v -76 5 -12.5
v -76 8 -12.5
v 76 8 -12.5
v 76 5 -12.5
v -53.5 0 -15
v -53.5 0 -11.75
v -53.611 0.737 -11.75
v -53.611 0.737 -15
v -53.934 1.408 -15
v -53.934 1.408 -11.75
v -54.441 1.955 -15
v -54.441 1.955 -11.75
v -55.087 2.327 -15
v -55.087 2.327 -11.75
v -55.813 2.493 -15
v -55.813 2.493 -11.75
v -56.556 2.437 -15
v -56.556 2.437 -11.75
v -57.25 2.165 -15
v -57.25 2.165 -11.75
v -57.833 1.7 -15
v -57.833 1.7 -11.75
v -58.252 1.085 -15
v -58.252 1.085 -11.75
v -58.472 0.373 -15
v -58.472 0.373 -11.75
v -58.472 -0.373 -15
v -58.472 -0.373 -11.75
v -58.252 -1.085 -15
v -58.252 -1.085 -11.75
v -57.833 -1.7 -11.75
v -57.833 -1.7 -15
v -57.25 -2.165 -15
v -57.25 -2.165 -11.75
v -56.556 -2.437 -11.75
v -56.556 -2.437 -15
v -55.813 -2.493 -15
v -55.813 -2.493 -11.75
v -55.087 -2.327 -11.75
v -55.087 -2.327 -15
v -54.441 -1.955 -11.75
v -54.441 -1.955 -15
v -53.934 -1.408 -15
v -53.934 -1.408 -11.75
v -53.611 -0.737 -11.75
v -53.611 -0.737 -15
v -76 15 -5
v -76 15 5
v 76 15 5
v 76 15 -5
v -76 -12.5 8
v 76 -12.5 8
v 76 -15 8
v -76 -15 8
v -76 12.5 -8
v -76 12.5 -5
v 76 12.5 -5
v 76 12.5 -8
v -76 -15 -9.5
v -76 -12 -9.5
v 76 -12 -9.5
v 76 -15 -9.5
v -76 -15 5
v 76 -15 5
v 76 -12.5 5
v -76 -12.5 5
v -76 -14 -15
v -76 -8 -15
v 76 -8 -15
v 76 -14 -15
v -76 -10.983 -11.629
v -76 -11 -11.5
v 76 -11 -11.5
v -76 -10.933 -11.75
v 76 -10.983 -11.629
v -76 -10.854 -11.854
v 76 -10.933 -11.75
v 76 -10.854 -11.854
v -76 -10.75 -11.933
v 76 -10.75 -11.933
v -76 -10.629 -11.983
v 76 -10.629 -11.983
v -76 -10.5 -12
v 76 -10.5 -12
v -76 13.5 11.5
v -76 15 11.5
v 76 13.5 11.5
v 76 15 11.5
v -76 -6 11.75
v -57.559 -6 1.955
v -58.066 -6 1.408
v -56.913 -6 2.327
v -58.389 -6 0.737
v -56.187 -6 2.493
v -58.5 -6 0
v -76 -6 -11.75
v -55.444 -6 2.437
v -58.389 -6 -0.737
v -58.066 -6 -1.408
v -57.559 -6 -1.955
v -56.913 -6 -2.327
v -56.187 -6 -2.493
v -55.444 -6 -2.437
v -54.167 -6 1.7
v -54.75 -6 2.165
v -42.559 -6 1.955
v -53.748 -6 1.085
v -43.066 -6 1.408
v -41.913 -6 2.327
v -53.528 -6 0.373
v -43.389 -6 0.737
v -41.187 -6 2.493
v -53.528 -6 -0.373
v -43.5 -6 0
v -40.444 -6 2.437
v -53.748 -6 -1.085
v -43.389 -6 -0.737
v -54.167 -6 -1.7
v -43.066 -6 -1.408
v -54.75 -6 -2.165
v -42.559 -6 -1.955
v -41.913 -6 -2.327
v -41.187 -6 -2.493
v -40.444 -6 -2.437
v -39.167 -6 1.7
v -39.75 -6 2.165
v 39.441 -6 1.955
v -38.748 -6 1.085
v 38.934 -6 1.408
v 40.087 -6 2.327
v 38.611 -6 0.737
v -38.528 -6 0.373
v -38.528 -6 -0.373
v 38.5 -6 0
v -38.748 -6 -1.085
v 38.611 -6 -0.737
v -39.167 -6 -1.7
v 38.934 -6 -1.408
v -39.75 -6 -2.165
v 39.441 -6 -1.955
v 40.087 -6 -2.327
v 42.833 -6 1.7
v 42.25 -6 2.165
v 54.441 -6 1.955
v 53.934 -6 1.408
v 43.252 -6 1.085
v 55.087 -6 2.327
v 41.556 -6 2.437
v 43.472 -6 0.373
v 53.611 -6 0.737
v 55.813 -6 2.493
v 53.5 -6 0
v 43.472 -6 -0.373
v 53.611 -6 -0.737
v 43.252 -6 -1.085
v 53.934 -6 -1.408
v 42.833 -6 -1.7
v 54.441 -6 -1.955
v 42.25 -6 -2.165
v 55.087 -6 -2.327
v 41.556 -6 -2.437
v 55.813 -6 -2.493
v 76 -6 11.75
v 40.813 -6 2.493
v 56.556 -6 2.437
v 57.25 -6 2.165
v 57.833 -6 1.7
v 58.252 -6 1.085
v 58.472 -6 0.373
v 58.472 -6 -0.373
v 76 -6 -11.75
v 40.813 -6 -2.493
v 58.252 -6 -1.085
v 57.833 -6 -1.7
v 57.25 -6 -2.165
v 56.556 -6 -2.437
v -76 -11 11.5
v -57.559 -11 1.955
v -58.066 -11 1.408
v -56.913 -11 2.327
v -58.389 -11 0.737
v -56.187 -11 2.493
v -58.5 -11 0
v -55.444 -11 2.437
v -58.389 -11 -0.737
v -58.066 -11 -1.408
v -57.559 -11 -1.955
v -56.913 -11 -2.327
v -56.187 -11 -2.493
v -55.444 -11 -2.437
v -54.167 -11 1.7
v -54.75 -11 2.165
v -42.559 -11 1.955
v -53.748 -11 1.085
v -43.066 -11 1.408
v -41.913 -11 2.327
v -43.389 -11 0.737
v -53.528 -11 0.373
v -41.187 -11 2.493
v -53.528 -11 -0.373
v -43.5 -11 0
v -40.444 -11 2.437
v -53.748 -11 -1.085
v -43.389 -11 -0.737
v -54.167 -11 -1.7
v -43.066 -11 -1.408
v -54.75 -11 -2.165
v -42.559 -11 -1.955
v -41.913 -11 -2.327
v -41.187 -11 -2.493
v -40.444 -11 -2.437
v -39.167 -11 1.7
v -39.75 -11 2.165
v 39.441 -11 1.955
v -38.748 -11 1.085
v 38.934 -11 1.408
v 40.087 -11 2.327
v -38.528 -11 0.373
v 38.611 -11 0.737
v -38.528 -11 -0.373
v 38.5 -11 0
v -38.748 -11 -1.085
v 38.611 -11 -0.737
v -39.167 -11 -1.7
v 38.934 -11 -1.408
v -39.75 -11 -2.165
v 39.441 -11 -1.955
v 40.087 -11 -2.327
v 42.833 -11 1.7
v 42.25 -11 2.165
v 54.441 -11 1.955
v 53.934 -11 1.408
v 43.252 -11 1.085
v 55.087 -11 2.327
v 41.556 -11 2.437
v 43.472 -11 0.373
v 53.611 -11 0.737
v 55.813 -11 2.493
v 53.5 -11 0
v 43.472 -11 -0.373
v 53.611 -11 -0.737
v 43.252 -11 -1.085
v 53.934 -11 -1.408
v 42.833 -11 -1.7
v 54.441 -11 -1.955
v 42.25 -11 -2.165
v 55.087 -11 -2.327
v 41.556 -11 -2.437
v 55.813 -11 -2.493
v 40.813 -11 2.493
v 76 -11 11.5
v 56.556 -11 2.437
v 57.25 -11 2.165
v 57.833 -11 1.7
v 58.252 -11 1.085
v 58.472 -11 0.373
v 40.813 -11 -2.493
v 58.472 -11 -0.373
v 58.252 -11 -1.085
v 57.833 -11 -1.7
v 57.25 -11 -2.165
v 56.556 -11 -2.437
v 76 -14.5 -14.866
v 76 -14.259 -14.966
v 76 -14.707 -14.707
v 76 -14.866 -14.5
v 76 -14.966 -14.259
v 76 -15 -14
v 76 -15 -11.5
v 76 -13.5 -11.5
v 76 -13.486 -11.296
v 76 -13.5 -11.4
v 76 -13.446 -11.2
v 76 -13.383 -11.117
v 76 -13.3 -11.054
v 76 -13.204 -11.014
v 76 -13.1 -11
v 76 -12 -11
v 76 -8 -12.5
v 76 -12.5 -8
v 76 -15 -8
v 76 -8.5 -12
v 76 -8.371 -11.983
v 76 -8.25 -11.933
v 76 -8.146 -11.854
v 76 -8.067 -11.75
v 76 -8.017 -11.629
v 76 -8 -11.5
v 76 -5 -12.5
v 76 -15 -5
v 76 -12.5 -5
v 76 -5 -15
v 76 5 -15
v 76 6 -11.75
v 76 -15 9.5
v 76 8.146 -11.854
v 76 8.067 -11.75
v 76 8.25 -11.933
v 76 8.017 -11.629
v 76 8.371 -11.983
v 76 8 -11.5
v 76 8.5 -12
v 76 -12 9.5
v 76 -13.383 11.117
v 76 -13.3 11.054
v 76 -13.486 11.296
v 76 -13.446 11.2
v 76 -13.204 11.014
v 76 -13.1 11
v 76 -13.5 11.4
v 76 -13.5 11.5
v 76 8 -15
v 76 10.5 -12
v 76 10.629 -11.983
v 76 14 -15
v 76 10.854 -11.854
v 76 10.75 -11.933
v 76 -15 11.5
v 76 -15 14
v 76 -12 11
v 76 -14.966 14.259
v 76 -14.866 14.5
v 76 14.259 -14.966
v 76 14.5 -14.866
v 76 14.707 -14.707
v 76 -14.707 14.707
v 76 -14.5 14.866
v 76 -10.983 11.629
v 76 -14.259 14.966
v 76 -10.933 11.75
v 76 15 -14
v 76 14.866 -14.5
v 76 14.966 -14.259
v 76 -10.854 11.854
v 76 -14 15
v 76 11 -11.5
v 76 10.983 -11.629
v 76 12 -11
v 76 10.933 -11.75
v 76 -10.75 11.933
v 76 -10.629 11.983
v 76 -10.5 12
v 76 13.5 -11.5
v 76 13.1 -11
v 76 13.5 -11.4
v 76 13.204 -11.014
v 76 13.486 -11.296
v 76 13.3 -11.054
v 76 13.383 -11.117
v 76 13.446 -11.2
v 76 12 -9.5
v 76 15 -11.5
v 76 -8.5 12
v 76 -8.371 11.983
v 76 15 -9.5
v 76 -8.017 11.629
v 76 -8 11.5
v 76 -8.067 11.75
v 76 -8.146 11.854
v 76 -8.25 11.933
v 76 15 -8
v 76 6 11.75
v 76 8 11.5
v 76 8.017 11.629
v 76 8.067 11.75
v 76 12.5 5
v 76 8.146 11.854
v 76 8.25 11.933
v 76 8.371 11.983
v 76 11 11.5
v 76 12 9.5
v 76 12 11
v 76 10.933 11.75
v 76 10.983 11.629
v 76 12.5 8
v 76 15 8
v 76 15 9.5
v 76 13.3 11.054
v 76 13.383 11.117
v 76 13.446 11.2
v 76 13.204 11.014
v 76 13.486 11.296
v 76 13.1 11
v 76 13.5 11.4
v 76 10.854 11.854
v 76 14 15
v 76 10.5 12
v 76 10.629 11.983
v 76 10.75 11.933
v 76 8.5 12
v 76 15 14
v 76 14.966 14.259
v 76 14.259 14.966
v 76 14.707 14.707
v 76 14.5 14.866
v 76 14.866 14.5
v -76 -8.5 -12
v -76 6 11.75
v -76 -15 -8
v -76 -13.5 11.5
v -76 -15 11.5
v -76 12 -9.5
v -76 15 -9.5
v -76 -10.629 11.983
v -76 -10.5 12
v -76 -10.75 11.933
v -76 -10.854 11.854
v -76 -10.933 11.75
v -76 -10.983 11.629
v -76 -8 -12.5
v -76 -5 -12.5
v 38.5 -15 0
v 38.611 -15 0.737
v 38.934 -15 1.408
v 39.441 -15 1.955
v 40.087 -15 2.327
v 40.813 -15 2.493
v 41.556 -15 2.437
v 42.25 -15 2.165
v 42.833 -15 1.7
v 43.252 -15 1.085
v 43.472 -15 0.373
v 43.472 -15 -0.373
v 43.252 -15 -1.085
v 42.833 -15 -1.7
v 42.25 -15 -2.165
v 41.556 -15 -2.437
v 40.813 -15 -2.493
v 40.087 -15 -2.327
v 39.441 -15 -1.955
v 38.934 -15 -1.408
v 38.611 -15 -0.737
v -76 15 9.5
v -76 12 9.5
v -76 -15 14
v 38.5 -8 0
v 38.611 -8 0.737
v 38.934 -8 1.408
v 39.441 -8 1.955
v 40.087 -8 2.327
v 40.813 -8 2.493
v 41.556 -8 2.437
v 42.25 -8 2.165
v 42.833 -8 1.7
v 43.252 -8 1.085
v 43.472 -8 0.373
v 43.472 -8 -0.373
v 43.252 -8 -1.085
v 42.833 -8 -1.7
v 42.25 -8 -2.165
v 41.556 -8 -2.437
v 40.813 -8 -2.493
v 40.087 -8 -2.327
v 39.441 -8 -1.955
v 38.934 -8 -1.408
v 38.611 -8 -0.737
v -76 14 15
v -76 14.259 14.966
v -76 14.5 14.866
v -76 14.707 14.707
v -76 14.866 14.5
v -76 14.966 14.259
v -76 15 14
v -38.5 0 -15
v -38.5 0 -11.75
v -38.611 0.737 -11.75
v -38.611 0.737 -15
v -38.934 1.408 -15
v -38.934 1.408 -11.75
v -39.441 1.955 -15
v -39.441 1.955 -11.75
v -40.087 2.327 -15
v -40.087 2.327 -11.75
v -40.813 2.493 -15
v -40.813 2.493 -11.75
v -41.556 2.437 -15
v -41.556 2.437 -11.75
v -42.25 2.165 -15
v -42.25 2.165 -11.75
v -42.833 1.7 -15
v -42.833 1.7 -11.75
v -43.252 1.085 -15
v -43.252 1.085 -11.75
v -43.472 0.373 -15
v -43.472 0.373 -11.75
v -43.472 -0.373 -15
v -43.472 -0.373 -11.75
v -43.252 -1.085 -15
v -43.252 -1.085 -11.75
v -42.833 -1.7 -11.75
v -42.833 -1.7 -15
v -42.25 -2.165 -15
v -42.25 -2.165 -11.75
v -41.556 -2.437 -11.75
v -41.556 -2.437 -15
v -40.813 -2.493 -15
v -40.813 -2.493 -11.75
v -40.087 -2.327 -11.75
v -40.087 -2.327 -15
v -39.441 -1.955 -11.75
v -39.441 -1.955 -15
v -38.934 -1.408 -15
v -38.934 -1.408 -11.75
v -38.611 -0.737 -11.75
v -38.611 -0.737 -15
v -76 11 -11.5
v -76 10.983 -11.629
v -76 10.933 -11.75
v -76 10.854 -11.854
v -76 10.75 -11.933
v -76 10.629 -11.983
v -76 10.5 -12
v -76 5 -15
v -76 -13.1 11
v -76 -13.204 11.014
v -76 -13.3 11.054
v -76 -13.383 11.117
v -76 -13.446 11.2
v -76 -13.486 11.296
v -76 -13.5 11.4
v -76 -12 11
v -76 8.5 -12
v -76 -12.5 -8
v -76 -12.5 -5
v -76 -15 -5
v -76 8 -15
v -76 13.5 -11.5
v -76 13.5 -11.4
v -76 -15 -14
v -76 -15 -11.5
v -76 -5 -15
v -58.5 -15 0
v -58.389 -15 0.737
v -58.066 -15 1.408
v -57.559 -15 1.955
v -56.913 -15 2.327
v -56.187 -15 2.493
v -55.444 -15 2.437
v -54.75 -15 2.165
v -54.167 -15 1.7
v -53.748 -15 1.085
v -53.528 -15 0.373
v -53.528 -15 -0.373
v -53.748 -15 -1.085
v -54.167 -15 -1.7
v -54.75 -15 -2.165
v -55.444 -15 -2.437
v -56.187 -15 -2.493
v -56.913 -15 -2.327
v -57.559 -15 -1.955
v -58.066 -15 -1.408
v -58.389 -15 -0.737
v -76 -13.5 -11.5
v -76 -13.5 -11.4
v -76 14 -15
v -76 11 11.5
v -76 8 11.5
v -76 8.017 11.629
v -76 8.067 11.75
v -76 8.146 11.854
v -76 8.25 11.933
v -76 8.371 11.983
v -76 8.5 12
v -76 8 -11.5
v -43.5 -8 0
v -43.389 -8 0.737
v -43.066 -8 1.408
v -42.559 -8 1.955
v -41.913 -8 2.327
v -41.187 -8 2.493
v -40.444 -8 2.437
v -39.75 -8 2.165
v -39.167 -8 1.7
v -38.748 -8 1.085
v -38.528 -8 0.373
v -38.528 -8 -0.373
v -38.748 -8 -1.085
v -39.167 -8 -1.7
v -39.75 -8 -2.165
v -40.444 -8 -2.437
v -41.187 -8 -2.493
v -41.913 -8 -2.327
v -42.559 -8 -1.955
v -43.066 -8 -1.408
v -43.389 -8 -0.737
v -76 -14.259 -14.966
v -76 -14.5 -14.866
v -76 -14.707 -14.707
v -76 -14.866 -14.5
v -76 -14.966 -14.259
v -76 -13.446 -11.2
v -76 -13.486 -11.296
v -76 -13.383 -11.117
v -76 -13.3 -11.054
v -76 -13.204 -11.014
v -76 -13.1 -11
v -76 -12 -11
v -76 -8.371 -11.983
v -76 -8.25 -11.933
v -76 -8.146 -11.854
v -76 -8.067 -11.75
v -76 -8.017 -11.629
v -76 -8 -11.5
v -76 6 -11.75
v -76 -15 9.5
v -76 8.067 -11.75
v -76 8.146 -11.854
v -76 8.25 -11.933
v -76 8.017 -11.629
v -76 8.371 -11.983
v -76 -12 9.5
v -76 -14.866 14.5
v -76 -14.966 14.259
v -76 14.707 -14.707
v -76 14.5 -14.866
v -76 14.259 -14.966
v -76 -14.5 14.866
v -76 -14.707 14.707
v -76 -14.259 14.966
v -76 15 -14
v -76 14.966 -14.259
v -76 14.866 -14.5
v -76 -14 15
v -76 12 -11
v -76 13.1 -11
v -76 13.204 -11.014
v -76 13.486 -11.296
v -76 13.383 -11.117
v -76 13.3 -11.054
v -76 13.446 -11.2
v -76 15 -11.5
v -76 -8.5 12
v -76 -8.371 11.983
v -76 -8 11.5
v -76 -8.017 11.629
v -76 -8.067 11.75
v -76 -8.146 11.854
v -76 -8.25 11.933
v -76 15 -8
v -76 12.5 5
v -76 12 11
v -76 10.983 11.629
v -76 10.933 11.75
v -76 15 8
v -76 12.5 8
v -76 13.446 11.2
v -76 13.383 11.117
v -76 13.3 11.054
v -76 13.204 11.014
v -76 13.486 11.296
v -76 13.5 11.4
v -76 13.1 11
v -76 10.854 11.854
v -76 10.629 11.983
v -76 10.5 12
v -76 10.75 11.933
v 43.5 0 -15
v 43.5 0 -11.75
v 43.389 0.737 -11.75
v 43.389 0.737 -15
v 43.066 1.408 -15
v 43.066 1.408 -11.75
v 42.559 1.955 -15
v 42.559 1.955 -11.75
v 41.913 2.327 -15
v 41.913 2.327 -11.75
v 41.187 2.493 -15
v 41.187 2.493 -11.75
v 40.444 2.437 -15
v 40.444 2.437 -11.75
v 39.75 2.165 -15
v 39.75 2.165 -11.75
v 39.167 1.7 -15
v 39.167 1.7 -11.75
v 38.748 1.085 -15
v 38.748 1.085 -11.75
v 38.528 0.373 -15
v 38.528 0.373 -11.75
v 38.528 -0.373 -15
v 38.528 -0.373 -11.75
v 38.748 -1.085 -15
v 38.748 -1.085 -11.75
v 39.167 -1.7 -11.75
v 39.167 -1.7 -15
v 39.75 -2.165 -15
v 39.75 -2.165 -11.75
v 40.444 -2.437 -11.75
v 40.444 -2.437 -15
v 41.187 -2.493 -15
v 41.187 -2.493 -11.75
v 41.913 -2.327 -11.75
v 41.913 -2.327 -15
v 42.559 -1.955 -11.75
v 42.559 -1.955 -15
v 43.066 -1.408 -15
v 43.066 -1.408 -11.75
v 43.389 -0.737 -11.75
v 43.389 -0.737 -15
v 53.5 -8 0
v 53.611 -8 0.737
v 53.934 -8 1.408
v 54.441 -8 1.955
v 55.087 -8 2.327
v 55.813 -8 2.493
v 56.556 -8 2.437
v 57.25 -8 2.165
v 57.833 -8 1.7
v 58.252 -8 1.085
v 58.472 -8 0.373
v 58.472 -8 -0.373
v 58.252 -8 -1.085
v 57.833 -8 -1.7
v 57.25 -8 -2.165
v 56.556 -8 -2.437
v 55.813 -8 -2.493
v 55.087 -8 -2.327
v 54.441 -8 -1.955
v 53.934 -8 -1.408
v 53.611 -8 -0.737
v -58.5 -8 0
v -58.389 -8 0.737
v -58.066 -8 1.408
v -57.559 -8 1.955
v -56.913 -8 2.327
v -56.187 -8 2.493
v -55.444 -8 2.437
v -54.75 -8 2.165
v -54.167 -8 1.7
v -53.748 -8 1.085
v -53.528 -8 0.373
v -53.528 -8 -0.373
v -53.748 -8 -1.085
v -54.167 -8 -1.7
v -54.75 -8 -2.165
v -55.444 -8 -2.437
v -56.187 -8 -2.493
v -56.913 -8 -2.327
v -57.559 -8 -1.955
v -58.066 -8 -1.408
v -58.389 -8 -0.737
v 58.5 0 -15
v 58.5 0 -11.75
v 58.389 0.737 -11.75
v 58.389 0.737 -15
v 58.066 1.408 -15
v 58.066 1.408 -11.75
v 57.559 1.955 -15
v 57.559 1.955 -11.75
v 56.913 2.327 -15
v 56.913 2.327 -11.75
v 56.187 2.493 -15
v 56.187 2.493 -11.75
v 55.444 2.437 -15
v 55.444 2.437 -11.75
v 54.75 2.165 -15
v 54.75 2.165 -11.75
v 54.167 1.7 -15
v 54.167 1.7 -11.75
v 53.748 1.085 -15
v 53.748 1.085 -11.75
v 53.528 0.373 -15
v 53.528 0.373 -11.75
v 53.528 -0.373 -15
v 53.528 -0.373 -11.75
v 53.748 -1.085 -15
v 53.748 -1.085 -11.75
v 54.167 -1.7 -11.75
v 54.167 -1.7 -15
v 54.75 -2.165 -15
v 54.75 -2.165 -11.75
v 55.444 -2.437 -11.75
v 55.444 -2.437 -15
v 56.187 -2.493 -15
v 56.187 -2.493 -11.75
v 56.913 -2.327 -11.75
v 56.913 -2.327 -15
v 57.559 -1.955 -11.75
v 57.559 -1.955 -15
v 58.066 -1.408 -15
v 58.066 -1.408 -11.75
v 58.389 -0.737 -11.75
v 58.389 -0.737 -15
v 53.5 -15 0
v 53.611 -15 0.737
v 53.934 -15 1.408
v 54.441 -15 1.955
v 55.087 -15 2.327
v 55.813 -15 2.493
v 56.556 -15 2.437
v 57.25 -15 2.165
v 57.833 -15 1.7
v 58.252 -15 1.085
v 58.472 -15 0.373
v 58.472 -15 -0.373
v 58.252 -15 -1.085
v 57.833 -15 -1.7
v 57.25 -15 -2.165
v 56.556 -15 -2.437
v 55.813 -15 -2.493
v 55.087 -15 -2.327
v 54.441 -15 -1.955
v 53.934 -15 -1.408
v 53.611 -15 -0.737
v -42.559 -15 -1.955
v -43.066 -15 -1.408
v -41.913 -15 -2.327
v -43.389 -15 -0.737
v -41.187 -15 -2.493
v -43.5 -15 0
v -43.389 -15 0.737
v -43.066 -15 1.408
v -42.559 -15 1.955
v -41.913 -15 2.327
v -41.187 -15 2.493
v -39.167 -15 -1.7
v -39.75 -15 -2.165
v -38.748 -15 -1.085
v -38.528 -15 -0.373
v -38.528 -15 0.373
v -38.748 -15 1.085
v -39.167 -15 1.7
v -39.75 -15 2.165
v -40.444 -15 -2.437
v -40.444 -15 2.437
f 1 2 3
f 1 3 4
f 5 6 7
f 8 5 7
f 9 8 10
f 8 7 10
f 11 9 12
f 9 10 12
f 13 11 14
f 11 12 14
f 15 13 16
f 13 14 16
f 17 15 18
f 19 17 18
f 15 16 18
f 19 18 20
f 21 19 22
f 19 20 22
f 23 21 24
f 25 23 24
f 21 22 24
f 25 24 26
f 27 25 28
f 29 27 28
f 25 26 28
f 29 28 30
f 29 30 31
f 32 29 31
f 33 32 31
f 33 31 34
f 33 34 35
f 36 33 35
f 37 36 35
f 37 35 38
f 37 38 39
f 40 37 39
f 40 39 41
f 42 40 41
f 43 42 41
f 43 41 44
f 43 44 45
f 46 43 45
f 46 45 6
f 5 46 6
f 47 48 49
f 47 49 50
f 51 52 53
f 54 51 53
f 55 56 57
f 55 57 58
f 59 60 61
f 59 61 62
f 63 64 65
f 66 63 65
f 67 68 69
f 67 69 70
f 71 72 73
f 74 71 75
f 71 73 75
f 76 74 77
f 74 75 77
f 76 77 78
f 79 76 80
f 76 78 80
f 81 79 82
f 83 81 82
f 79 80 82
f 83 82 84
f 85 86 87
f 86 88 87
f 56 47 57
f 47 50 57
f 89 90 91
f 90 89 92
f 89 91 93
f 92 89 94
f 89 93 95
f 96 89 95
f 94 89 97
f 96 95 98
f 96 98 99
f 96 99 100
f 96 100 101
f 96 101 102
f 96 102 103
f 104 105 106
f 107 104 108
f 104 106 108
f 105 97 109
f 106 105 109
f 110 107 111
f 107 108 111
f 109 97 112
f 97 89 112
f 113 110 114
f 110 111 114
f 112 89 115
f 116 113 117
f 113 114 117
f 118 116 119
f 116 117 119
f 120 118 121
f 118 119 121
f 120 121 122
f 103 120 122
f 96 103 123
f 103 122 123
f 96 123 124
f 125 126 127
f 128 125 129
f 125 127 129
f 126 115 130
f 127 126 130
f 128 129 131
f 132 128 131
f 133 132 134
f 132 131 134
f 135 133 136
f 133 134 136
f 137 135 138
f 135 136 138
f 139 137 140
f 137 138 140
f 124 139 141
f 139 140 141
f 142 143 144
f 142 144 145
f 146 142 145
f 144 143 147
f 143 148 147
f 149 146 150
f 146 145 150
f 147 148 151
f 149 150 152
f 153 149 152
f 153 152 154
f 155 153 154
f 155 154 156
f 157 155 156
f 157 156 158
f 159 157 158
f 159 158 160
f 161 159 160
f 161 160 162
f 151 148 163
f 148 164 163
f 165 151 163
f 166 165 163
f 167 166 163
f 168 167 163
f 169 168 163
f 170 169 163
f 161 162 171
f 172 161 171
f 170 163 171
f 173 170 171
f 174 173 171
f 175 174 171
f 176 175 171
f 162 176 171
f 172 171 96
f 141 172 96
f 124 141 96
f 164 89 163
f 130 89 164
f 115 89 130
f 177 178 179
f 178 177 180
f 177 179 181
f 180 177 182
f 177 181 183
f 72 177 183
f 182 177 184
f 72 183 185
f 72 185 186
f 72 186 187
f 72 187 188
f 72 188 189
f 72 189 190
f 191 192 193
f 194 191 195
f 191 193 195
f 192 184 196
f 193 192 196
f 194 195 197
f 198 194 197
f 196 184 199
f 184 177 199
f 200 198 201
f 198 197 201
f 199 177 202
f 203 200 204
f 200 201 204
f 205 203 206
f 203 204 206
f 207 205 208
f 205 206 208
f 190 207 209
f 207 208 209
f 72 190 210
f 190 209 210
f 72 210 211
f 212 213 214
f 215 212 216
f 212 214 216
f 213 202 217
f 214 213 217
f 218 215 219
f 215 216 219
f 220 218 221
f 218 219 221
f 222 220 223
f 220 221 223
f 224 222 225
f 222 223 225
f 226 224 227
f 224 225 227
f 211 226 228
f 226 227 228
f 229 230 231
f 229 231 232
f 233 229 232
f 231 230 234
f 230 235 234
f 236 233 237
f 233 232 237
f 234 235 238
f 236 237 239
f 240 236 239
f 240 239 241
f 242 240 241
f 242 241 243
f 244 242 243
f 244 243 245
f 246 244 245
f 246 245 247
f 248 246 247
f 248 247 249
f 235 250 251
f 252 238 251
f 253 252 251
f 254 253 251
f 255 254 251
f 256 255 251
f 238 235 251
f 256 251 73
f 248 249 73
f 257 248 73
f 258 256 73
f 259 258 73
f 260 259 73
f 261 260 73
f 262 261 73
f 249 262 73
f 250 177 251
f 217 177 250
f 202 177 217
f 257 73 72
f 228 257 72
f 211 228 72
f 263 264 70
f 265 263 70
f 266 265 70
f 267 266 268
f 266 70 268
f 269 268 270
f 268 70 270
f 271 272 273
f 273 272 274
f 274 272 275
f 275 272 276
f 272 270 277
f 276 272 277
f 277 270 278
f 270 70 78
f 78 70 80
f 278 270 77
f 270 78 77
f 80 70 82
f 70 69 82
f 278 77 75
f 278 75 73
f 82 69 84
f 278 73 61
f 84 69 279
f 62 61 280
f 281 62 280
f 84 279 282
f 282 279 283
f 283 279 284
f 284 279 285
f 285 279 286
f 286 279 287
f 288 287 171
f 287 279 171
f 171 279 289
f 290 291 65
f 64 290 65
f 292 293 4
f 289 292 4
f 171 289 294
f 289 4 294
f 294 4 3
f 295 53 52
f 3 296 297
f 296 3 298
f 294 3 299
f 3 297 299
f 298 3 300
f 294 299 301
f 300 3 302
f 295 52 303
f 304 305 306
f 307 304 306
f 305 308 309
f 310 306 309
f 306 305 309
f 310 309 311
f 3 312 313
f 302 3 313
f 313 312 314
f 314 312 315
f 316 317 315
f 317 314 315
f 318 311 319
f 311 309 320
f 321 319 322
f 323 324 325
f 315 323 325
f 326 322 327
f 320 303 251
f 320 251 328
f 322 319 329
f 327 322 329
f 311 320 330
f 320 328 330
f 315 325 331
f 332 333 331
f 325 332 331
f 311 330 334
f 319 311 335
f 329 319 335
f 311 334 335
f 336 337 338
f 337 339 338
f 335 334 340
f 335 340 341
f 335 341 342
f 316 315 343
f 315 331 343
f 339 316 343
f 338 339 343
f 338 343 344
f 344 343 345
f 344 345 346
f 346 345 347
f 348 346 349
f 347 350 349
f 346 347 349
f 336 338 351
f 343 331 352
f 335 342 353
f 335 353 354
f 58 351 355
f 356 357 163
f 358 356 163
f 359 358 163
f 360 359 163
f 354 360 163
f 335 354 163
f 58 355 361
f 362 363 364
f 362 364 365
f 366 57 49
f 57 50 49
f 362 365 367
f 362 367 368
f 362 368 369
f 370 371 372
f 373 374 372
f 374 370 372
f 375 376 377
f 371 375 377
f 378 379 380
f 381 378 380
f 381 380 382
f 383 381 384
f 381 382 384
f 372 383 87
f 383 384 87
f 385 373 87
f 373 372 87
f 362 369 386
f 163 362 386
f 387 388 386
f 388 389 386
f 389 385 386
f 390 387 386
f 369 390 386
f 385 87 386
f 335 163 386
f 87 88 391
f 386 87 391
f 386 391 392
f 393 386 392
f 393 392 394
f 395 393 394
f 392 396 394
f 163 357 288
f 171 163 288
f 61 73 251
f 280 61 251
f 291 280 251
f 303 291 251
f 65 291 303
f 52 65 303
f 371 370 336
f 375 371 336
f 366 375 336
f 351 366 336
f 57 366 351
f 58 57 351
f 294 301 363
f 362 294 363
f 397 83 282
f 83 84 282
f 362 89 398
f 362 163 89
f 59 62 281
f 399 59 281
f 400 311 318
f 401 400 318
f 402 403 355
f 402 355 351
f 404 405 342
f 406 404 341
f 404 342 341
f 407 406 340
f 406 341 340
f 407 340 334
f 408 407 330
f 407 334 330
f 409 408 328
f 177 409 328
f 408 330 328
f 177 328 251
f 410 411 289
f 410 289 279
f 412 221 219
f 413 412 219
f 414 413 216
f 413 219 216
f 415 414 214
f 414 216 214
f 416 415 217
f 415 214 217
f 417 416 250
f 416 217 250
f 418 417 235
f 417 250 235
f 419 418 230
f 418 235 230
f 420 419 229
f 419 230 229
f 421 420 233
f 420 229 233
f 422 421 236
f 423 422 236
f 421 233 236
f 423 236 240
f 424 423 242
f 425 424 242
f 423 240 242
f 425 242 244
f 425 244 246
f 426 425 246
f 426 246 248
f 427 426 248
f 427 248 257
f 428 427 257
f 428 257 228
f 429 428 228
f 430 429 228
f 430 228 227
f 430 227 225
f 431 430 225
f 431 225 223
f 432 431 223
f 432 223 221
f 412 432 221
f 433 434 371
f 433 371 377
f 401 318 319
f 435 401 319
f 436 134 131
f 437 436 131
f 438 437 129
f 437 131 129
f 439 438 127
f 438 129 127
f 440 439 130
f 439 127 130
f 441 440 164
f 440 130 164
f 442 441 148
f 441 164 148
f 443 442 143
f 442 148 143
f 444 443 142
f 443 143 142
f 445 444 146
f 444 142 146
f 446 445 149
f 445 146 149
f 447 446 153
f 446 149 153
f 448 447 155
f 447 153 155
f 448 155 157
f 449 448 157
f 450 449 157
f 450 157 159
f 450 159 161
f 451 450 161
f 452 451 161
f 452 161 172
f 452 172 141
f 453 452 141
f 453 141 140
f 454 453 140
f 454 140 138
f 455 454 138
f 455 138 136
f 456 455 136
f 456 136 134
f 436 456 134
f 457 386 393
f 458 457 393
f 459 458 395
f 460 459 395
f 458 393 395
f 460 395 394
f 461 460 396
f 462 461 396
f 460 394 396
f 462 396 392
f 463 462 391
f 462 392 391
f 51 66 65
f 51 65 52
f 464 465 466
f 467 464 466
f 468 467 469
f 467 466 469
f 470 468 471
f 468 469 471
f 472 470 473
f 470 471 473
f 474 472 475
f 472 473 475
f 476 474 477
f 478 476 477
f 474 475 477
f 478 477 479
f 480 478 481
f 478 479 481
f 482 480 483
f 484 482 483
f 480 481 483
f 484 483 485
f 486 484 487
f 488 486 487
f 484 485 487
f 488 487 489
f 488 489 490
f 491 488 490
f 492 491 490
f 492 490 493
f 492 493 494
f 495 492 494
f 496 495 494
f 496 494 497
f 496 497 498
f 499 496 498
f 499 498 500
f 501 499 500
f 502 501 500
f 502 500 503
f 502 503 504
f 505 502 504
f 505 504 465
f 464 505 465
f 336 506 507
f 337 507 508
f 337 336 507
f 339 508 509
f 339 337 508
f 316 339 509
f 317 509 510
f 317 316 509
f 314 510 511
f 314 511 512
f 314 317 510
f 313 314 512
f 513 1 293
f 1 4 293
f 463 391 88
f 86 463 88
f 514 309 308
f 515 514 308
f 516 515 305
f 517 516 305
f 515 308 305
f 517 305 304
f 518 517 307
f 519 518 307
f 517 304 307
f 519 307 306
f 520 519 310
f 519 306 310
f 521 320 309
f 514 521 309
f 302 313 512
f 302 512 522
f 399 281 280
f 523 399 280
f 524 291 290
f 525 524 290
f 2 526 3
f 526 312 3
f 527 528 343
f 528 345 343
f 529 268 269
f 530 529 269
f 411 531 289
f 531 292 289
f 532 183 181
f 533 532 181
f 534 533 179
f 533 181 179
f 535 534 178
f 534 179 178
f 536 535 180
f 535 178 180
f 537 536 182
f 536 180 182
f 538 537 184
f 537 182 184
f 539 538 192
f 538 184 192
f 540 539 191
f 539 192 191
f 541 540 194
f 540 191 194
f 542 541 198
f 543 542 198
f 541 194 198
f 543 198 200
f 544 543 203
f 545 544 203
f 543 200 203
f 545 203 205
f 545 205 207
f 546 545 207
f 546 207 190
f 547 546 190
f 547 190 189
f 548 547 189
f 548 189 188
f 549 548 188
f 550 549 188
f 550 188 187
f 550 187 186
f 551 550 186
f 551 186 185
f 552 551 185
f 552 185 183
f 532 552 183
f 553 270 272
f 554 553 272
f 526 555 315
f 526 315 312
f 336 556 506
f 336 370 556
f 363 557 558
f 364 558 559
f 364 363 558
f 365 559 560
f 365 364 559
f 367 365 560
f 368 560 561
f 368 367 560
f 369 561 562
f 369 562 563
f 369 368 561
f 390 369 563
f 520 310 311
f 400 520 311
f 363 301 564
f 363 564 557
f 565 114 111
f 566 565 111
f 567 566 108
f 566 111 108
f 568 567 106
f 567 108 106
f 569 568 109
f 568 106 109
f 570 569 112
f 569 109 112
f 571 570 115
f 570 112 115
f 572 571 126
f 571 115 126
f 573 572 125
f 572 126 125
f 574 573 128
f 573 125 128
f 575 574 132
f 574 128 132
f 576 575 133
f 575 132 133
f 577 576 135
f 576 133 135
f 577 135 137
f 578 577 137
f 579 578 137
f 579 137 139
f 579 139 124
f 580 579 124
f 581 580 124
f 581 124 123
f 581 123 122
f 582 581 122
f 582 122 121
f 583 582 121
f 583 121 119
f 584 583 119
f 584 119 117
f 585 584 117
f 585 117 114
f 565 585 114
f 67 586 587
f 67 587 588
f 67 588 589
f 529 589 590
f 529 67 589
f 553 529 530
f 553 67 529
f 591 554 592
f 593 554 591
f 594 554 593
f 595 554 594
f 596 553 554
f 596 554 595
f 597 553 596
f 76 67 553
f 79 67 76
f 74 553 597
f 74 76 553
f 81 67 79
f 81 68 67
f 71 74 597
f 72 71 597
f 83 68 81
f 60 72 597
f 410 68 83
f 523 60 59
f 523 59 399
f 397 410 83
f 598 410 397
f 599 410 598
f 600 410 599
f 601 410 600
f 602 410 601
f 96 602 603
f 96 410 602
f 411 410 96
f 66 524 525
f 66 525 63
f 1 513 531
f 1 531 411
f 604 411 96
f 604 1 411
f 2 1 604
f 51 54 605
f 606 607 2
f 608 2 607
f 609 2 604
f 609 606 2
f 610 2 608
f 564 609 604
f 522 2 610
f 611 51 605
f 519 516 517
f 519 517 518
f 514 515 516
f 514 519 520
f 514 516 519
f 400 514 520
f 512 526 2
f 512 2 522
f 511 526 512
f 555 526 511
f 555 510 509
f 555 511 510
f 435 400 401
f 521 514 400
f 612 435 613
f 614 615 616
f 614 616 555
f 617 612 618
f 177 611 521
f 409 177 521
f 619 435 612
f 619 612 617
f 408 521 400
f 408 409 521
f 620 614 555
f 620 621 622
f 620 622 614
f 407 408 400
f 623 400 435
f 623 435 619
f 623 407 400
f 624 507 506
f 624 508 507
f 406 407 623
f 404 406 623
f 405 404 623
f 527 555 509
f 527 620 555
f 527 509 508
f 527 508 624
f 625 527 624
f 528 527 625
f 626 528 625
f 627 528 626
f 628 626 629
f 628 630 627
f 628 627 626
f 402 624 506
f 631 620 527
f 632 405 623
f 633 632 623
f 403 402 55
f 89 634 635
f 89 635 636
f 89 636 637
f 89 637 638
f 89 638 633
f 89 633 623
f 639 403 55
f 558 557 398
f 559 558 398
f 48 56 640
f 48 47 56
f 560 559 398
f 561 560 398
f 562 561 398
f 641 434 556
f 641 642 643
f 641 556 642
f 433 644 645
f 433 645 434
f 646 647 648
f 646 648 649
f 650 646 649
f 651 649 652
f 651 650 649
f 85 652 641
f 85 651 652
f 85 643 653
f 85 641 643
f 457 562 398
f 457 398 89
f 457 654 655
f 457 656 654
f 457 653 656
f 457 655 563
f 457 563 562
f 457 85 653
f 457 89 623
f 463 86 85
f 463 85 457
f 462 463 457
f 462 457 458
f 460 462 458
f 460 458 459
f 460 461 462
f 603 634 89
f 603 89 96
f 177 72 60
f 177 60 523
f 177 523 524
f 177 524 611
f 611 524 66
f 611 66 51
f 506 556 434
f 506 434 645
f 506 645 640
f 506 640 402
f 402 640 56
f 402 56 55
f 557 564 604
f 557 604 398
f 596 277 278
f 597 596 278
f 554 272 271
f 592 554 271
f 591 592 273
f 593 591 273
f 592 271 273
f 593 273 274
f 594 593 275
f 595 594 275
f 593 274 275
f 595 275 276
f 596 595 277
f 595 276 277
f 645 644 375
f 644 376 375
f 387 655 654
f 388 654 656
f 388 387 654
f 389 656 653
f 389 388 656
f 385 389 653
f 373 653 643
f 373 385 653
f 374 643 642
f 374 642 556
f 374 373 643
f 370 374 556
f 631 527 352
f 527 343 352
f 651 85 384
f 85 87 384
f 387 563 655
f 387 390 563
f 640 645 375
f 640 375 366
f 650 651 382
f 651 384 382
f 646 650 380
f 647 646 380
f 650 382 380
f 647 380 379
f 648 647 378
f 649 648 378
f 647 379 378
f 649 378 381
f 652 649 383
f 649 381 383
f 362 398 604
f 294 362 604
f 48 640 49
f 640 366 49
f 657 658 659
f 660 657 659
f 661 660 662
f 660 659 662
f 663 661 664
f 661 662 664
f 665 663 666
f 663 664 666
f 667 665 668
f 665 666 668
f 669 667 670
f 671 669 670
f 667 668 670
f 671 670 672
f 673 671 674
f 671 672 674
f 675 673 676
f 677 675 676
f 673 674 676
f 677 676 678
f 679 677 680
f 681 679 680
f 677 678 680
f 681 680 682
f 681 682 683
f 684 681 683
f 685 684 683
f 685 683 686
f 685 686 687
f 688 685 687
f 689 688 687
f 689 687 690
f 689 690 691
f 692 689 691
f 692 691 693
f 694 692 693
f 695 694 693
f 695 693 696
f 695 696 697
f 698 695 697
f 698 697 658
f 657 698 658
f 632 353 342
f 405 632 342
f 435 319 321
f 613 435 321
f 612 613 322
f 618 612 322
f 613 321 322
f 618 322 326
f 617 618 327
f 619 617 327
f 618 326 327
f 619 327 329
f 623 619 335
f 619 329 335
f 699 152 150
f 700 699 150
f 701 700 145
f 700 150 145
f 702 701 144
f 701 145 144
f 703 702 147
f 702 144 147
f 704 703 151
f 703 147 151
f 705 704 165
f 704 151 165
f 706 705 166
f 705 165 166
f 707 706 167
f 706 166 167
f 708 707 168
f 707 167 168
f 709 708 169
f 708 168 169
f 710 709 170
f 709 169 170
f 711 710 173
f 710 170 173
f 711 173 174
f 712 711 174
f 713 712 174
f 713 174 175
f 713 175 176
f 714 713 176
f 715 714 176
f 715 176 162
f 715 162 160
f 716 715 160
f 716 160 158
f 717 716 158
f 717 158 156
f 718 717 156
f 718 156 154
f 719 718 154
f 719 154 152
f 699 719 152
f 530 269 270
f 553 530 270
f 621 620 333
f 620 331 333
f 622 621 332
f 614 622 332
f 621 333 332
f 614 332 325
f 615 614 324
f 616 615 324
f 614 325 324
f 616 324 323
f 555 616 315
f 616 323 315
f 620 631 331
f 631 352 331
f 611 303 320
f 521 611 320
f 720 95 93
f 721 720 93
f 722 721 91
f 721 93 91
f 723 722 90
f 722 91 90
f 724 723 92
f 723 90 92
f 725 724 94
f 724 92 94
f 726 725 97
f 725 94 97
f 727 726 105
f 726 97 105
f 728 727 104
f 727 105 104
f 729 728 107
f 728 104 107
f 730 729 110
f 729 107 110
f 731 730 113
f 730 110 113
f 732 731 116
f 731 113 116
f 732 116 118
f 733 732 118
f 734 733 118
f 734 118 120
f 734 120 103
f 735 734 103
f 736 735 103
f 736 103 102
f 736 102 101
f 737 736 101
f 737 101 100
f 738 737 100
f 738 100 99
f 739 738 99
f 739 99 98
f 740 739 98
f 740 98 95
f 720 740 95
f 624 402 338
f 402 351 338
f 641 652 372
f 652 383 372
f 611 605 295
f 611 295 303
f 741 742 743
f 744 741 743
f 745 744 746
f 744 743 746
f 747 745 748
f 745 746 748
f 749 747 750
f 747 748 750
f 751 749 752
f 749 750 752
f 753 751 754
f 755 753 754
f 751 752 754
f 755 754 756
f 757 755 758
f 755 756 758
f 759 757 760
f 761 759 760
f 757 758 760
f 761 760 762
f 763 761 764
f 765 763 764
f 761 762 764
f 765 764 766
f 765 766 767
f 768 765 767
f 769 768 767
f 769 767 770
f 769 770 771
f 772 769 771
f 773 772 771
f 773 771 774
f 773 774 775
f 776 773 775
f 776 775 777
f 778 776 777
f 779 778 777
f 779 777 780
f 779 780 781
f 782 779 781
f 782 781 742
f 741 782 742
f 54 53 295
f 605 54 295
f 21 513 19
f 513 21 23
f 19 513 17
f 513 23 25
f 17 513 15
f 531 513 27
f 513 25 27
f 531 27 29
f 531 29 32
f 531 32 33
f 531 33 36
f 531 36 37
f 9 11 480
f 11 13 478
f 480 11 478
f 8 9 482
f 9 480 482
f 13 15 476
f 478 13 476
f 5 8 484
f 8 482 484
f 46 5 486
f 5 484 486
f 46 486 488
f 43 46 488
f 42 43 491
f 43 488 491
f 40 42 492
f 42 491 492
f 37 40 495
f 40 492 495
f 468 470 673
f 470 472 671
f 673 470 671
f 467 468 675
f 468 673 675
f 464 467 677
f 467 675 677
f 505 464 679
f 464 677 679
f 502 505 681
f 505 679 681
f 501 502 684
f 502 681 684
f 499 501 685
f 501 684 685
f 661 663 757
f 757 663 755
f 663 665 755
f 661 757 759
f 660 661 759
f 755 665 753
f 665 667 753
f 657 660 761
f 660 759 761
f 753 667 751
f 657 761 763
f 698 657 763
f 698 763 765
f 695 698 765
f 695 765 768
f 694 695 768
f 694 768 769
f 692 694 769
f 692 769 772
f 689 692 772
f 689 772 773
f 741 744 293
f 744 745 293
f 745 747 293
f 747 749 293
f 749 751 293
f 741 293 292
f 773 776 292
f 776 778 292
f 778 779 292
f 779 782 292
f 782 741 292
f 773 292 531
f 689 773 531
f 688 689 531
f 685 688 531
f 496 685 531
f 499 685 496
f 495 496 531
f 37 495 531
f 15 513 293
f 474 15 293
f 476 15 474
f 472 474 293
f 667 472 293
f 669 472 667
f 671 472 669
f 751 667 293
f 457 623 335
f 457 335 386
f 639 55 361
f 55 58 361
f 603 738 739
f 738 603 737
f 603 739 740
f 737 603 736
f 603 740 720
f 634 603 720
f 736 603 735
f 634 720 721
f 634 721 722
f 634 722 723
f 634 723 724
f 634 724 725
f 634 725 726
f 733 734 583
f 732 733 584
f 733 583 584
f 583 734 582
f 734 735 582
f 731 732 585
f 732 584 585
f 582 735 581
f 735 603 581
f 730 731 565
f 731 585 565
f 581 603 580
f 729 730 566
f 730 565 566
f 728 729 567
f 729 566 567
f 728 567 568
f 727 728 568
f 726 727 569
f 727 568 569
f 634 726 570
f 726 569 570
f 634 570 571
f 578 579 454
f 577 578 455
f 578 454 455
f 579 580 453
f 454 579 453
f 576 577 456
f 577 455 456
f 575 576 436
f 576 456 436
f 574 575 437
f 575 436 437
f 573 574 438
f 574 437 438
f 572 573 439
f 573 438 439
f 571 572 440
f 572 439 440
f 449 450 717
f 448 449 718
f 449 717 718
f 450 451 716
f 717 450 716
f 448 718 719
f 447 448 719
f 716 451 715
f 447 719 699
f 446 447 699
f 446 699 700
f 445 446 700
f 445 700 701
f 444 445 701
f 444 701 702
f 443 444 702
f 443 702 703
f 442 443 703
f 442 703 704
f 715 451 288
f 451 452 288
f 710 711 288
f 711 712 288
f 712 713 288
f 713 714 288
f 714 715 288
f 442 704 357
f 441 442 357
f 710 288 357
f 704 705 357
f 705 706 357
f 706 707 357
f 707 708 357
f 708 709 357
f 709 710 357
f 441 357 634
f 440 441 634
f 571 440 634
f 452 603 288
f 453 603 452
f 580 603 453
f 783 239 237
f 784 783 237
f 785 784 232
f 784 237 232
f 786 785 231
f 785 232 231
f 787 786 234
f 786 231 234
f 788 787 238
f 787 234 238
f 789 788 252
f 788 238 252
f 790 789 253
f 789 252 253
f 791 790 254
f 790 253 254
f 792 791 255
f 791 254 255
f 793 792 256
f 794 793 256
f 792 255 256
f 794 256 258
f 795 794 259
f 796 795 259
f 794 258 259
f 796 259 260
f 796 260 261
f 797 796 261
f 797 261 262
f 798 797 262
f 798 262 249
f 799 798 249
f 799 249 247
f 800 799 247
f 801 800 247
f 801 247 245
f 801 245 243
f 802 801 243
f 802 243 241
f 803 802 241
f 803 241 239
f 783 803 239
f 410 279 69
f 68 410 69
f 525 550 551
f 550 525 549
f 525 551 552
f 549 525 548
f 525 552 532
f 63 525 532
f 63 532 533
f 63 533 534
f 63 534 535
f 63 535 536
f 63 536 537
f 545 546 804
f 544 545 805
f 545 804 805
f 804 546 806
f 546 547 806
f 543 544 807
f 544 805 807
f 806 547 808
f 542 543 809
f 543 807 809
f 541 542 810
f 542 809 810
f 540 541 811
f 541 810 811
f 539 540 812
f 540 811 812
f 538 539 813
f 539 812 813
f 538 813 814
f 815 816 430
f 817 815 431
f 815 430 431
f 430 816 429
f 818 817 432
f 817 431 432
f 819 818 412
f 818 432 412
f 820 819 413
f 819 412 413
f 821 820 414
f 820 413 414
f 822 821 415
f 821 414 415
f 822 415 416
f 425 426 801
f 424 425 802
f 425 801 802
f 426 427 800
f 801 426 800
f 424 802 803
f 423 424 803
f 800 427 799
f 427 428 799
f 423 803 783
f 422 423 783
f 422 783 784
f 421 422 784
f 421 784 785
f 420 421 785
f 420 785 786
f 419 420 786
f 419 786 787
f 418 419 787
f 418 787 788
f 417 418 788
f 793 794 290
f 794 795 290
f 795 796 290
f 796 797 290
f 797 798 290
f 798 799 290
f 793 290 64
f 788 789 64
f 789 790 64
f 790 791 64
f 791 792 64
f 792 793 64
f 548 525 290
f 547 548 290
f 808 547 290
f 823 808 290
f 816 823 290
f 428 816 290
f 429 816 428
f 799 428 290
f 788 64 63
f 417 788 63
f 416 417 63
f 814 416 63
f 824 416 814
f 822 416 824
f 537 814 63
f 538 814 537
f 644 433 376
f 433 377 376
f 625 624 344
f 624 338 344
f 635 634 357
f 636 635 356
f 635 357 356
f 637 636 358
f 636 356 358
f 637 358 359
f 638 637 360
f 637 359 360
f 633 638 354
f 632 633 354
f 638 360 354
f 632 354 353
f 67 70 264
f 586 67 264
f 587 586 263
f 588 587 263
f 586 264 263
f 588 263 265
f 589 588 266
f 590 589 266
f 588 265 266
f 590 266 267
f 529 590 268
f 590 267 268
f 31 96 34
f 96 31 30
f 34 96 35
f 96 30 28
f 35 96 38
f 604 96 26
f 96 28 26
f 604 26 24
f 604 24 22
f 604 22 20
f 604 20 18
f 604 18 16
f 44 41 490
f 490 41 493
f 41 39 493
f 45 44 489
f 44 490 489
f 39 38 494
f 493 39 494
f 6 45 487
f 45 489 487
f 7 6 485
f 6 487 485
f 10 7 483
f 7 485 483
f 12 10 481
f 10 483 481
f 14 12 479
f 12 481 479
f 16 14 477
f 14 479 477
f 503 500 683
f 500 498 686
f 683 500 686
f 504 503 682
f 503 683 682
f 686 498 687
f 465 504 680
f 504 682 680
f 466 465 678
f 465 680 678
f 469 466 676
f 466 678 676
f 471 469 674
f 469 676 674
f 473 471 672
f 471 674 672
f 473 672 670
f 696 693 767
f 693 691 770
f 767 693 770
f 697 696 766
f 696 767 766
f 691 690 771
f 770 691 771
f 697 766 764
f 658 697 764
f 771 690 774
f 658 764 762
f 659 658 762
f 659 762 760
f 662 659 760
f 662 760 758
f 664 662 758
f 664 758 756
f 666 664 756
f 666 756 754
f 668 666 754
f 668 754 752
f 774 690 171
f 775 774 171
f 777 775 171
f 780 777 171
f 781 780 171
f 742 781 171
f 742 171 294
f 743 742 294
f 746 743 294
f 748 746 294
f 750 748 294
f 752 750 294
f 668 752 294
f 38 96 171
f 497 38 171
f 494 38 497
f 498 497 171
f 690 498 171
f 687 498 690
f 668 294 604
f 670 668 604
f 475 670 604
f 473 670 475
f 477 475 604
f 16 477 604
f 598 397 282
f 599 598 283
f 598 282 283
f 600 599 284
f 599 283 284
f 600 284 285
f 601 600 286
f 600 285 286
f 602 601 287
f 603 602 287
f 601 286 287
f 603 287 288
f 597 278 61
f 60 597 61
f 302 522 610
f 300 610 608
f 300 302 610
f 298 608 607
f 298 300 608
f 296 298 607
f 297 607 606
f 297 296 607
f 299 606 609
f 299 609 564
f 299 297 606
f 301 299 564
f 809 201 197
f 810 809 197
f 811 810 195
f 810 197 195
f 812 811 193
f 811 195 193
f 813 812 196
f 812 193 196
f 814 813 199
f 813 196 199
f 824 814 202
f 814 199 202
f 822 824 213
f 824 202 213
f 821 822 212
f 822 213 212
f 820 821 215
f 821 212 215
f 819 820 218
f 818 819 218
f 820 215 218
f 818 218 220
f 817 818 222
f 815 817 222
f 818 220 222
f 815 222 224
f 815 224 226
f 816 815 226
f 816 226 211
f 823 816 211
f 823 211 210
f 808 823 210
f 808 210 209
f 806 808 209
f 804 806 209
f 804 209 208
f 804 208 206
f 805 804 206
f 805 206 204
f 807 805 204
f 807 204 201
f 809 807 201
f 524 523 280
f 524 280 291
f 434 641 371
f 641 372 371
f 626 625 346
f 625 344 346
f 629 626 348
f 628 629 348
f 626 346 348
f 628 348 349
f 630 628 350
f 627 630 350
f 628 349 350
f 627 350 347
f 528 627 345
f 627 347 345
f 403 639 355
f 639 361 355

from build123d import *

# Parameters (mm, degrees)
SKETCH_1_W             = 23.5
SKETCH_1_H             = 12
EXTRUDE_1_DEPTH        = 76
HOLE_WIZARD_M6_1_D     = 5
HOLE_WIZARD_M6_1_DEPTH = 15
HOLE_WIZARD_M6_1_TIP   = 1.502151548
HOLE_WIZARD_M6_2_D     = 5
HOLE_WIZARD_M6_2_DEPTH = 15
HOLE_WIZARD_M6_2_TIP   = 1.502151548


with BuildPart() as part:
    # 草图1 → 凸台-拉伸1 (new, symmetric)
    with BuildSketch(Plane(origin=(0, 0, 0), x_dir=(0, 0, -1), z_dir=(1, 0, 0))):
        with BuildLine():
            Line((-14, 15), (-11.5, 15))
            Line((-11.5, 15), (-11.5, 13.5))
            Line((-11.5, 13.5), (-11.4, 13.5))
            ThreePointArc((-11.4, 13.5), (-11.117157288, 13.382842712), (-11, 13.1))
            Line((-11, 13.1), (-11, 12))
            Line((-11, 12), (-9.5, 12))
            Line((-9.5, 12), (-9.5, 15))
            Line((-9.5, 15), (-8, 15))
            Line((-8, 15), (-8, 12.5))
            Line((-8, 12.5), (-5, 12.5))
            Line((-5, 12.5), (-5, 15))
            Line((-5, 15), (5, 15))
            Line((5, 15), (5, 12.5))
            Line((5, 12.5), (8, 12.5))
            Line((8, 12.5), (8, 15))
            Line((8, 15), (9.5, 15))
            Line((9.5, 15), (9.5, 12))
            Line((9.5, 12), (11, 12))
            Line((11, 12), (11, 13.1))
            ThreePointArc((11, 13.1), (11.117157288, 13.382842712), (11.4, 13.5))
            Line((11.4, 13.5), (11.5, 13.5))
            Line((11.5, 13.5), (11.5, 15))
            Line((11.5, 15), (14, 15))
            ThreePointArc((14, 15), (14.707106781, 14.707106781), (15, 14))
            Line((15, 14), (15, 8))
            Line((15, 8), (12.5, 8))
            Line((12.5, 8), (12.5, 5))
            Line((12.5, 5), (15, 5))
            Line((15, 5), (15, -5))
            Line((15, -5), (12.5, -5))
            Line((12.5, -5), (12.5, -8))
            Line((12.5, -8), (15, -8))
            Line((15, -8), (15, -14))
            ThreePointArc((15, -14), (14.707106781, -14.707106781), (14, -15))
            Line((14, -15), (11.5, -15))
            Line((11.5, -15), (11.5, -13.5))
            Line((11.5, -13.5), (11.4, -13.5))
            ThreePointArc((11.4, -13.5), (11.117157288, -13.382842712), (11, -13.1))
            Line((11, -13.1), (11, -12))
            Line((11, -12), (9.5, -12))
            Line((9.5, -12), (9.5, -15))
            Line((9.5, -15), (8, -15))
            Line((8, -15), (8, -12.5))
            Line((8, -12.5), (5, -12.5))
            Line((5, -12.5), (5, -15))
            Line((5, -15), (-5, -15))
            Line((-5, -15), (-5, -12.5))
            Line((-5, -12.5), (-8, -12.5))
            Line((-8, -12.5), (-8, -15))
            Line((-8, -15), (-9.5, -15))
            Line((-9.5, -15), (-9.5, -12))
            Line((-9.5, -12), (-11, -12))
            Line((-11, -12), (-11, -13.1))
            ThreePointArc((-11, -13.1), (-11.117157288, -13.382842712), (-11.4, -13.5))
            Line((-11.4, -13.5), (-11.5, -13.5))
            Line((-11.5, -13.5), (-11.5, -15))
            Line((-11.5, -15), (-14, -15))
            ThreePointArc((-14, -15), (-14.707106781, -14.707106781), (-15, -14))
            Line((-15, -14), (-15, 14))
            ThreePointArc((-15, 14), (-14.707106781, 14.707106781), (-14, 15))
        make_face()
        with BuildLine():
            Line((12, -10.5), (12, -8.5))
            ThreePointArc((12, -8.5), (11.853553391, -8.146446609), (11.5, -8))
            Line((11.5, -8), (-11.5, -8))
            ThreePointArc((-11.5, -8), (-11.853553391, -8.146446609), (-12, -8.5))
            Line((-12, -8.5), (-12, -10.5))
            ThreePointArc((-12, -10.5), (-11.853553391, -10.853553391), (-11.5, -11))
            Line((-11.5, -11), (11.5, -11))
            ThreePointArc((11.5, -11), (11.853553391, -10.853553391), (12, -10.5))
        make_face(mode=Mode.SUBTRACT)
        with BuildLine():
            Line((-11.5, 11), (11.5, 11))
            ThreePointArc((11.5, 11), (11.853553391, 10.853553391), (12, 10.5))
            Line((12, 10.5), (12, 8.5))
            ThreePointArc((12, 8.5), (11.853553391, 8.146446609), (11.5, 8))
            Line((11.5, 8), (-11.5, 8))
            ThreePointArc((-11.5, 8), (-11.853553391, 8.146446609), (-12, 8.5))
            Line((-12, 8.5), (-12, 10.5))
            ThreePointArc((-12, 10.5), (-11.853553391, 10.853553391), (-11.5, 11))
        make_face(mode=Mode.SUBTRACT)
        Rectangle(SKETCH_1_W, SKETCH_1_H, mode=Mode.SUBTRACT)
    extrude(amount=EXTRUDE_1_DEPTH, both=True)

    # M6 螺纹孔1
    with Locations(Plane(origin=(0, 0, -15), x_dir=(-1, 0, 0), z_dir=(0, 0, -1))):
        with Locations((-56, 0), (-41, 0), (41, 0), (56, 0)):
            Hole(HOLE_WIZARD_M6_1_D / 2, depth=HOLE_WIZARD_M6_1_DEPTH)
            with Locations((0, 0, -(HOLE_WIZARD_M6_1_DEPTH + HOLE_WIZARD_M6_1_TIP / 2))):  # 118° drill point
                Cone(0, HOLE_WIZARD_M6_1_D / 2, HOLE_WIZARD_M6_1_TIP, mode=Mode.SUBTRACT)

    # M6 螺纹孔2
    with Locations(Plane.XZ.offset(15)):
        with Locations((56, 0), (41, 0), (-41, 0), (-56, 0)):
            Hole(HOLE_WIZARD_M6_2_D / 2, depth=HOLE_WIZARD_M6_2_DEPTH)
            with Locations((0, 0, -(HOLE_WIZARD_M6_2_DEPTH + HOLE_WIZARD_M6_2_TIP / 2))):  # 118° drill point
                Cone(0, HOLE_WIZARD_M6_2_D / 2, HOLE_WIZARD_M6_2_TIP, mode=Mode.SUBTRACT)


solid = part.part
